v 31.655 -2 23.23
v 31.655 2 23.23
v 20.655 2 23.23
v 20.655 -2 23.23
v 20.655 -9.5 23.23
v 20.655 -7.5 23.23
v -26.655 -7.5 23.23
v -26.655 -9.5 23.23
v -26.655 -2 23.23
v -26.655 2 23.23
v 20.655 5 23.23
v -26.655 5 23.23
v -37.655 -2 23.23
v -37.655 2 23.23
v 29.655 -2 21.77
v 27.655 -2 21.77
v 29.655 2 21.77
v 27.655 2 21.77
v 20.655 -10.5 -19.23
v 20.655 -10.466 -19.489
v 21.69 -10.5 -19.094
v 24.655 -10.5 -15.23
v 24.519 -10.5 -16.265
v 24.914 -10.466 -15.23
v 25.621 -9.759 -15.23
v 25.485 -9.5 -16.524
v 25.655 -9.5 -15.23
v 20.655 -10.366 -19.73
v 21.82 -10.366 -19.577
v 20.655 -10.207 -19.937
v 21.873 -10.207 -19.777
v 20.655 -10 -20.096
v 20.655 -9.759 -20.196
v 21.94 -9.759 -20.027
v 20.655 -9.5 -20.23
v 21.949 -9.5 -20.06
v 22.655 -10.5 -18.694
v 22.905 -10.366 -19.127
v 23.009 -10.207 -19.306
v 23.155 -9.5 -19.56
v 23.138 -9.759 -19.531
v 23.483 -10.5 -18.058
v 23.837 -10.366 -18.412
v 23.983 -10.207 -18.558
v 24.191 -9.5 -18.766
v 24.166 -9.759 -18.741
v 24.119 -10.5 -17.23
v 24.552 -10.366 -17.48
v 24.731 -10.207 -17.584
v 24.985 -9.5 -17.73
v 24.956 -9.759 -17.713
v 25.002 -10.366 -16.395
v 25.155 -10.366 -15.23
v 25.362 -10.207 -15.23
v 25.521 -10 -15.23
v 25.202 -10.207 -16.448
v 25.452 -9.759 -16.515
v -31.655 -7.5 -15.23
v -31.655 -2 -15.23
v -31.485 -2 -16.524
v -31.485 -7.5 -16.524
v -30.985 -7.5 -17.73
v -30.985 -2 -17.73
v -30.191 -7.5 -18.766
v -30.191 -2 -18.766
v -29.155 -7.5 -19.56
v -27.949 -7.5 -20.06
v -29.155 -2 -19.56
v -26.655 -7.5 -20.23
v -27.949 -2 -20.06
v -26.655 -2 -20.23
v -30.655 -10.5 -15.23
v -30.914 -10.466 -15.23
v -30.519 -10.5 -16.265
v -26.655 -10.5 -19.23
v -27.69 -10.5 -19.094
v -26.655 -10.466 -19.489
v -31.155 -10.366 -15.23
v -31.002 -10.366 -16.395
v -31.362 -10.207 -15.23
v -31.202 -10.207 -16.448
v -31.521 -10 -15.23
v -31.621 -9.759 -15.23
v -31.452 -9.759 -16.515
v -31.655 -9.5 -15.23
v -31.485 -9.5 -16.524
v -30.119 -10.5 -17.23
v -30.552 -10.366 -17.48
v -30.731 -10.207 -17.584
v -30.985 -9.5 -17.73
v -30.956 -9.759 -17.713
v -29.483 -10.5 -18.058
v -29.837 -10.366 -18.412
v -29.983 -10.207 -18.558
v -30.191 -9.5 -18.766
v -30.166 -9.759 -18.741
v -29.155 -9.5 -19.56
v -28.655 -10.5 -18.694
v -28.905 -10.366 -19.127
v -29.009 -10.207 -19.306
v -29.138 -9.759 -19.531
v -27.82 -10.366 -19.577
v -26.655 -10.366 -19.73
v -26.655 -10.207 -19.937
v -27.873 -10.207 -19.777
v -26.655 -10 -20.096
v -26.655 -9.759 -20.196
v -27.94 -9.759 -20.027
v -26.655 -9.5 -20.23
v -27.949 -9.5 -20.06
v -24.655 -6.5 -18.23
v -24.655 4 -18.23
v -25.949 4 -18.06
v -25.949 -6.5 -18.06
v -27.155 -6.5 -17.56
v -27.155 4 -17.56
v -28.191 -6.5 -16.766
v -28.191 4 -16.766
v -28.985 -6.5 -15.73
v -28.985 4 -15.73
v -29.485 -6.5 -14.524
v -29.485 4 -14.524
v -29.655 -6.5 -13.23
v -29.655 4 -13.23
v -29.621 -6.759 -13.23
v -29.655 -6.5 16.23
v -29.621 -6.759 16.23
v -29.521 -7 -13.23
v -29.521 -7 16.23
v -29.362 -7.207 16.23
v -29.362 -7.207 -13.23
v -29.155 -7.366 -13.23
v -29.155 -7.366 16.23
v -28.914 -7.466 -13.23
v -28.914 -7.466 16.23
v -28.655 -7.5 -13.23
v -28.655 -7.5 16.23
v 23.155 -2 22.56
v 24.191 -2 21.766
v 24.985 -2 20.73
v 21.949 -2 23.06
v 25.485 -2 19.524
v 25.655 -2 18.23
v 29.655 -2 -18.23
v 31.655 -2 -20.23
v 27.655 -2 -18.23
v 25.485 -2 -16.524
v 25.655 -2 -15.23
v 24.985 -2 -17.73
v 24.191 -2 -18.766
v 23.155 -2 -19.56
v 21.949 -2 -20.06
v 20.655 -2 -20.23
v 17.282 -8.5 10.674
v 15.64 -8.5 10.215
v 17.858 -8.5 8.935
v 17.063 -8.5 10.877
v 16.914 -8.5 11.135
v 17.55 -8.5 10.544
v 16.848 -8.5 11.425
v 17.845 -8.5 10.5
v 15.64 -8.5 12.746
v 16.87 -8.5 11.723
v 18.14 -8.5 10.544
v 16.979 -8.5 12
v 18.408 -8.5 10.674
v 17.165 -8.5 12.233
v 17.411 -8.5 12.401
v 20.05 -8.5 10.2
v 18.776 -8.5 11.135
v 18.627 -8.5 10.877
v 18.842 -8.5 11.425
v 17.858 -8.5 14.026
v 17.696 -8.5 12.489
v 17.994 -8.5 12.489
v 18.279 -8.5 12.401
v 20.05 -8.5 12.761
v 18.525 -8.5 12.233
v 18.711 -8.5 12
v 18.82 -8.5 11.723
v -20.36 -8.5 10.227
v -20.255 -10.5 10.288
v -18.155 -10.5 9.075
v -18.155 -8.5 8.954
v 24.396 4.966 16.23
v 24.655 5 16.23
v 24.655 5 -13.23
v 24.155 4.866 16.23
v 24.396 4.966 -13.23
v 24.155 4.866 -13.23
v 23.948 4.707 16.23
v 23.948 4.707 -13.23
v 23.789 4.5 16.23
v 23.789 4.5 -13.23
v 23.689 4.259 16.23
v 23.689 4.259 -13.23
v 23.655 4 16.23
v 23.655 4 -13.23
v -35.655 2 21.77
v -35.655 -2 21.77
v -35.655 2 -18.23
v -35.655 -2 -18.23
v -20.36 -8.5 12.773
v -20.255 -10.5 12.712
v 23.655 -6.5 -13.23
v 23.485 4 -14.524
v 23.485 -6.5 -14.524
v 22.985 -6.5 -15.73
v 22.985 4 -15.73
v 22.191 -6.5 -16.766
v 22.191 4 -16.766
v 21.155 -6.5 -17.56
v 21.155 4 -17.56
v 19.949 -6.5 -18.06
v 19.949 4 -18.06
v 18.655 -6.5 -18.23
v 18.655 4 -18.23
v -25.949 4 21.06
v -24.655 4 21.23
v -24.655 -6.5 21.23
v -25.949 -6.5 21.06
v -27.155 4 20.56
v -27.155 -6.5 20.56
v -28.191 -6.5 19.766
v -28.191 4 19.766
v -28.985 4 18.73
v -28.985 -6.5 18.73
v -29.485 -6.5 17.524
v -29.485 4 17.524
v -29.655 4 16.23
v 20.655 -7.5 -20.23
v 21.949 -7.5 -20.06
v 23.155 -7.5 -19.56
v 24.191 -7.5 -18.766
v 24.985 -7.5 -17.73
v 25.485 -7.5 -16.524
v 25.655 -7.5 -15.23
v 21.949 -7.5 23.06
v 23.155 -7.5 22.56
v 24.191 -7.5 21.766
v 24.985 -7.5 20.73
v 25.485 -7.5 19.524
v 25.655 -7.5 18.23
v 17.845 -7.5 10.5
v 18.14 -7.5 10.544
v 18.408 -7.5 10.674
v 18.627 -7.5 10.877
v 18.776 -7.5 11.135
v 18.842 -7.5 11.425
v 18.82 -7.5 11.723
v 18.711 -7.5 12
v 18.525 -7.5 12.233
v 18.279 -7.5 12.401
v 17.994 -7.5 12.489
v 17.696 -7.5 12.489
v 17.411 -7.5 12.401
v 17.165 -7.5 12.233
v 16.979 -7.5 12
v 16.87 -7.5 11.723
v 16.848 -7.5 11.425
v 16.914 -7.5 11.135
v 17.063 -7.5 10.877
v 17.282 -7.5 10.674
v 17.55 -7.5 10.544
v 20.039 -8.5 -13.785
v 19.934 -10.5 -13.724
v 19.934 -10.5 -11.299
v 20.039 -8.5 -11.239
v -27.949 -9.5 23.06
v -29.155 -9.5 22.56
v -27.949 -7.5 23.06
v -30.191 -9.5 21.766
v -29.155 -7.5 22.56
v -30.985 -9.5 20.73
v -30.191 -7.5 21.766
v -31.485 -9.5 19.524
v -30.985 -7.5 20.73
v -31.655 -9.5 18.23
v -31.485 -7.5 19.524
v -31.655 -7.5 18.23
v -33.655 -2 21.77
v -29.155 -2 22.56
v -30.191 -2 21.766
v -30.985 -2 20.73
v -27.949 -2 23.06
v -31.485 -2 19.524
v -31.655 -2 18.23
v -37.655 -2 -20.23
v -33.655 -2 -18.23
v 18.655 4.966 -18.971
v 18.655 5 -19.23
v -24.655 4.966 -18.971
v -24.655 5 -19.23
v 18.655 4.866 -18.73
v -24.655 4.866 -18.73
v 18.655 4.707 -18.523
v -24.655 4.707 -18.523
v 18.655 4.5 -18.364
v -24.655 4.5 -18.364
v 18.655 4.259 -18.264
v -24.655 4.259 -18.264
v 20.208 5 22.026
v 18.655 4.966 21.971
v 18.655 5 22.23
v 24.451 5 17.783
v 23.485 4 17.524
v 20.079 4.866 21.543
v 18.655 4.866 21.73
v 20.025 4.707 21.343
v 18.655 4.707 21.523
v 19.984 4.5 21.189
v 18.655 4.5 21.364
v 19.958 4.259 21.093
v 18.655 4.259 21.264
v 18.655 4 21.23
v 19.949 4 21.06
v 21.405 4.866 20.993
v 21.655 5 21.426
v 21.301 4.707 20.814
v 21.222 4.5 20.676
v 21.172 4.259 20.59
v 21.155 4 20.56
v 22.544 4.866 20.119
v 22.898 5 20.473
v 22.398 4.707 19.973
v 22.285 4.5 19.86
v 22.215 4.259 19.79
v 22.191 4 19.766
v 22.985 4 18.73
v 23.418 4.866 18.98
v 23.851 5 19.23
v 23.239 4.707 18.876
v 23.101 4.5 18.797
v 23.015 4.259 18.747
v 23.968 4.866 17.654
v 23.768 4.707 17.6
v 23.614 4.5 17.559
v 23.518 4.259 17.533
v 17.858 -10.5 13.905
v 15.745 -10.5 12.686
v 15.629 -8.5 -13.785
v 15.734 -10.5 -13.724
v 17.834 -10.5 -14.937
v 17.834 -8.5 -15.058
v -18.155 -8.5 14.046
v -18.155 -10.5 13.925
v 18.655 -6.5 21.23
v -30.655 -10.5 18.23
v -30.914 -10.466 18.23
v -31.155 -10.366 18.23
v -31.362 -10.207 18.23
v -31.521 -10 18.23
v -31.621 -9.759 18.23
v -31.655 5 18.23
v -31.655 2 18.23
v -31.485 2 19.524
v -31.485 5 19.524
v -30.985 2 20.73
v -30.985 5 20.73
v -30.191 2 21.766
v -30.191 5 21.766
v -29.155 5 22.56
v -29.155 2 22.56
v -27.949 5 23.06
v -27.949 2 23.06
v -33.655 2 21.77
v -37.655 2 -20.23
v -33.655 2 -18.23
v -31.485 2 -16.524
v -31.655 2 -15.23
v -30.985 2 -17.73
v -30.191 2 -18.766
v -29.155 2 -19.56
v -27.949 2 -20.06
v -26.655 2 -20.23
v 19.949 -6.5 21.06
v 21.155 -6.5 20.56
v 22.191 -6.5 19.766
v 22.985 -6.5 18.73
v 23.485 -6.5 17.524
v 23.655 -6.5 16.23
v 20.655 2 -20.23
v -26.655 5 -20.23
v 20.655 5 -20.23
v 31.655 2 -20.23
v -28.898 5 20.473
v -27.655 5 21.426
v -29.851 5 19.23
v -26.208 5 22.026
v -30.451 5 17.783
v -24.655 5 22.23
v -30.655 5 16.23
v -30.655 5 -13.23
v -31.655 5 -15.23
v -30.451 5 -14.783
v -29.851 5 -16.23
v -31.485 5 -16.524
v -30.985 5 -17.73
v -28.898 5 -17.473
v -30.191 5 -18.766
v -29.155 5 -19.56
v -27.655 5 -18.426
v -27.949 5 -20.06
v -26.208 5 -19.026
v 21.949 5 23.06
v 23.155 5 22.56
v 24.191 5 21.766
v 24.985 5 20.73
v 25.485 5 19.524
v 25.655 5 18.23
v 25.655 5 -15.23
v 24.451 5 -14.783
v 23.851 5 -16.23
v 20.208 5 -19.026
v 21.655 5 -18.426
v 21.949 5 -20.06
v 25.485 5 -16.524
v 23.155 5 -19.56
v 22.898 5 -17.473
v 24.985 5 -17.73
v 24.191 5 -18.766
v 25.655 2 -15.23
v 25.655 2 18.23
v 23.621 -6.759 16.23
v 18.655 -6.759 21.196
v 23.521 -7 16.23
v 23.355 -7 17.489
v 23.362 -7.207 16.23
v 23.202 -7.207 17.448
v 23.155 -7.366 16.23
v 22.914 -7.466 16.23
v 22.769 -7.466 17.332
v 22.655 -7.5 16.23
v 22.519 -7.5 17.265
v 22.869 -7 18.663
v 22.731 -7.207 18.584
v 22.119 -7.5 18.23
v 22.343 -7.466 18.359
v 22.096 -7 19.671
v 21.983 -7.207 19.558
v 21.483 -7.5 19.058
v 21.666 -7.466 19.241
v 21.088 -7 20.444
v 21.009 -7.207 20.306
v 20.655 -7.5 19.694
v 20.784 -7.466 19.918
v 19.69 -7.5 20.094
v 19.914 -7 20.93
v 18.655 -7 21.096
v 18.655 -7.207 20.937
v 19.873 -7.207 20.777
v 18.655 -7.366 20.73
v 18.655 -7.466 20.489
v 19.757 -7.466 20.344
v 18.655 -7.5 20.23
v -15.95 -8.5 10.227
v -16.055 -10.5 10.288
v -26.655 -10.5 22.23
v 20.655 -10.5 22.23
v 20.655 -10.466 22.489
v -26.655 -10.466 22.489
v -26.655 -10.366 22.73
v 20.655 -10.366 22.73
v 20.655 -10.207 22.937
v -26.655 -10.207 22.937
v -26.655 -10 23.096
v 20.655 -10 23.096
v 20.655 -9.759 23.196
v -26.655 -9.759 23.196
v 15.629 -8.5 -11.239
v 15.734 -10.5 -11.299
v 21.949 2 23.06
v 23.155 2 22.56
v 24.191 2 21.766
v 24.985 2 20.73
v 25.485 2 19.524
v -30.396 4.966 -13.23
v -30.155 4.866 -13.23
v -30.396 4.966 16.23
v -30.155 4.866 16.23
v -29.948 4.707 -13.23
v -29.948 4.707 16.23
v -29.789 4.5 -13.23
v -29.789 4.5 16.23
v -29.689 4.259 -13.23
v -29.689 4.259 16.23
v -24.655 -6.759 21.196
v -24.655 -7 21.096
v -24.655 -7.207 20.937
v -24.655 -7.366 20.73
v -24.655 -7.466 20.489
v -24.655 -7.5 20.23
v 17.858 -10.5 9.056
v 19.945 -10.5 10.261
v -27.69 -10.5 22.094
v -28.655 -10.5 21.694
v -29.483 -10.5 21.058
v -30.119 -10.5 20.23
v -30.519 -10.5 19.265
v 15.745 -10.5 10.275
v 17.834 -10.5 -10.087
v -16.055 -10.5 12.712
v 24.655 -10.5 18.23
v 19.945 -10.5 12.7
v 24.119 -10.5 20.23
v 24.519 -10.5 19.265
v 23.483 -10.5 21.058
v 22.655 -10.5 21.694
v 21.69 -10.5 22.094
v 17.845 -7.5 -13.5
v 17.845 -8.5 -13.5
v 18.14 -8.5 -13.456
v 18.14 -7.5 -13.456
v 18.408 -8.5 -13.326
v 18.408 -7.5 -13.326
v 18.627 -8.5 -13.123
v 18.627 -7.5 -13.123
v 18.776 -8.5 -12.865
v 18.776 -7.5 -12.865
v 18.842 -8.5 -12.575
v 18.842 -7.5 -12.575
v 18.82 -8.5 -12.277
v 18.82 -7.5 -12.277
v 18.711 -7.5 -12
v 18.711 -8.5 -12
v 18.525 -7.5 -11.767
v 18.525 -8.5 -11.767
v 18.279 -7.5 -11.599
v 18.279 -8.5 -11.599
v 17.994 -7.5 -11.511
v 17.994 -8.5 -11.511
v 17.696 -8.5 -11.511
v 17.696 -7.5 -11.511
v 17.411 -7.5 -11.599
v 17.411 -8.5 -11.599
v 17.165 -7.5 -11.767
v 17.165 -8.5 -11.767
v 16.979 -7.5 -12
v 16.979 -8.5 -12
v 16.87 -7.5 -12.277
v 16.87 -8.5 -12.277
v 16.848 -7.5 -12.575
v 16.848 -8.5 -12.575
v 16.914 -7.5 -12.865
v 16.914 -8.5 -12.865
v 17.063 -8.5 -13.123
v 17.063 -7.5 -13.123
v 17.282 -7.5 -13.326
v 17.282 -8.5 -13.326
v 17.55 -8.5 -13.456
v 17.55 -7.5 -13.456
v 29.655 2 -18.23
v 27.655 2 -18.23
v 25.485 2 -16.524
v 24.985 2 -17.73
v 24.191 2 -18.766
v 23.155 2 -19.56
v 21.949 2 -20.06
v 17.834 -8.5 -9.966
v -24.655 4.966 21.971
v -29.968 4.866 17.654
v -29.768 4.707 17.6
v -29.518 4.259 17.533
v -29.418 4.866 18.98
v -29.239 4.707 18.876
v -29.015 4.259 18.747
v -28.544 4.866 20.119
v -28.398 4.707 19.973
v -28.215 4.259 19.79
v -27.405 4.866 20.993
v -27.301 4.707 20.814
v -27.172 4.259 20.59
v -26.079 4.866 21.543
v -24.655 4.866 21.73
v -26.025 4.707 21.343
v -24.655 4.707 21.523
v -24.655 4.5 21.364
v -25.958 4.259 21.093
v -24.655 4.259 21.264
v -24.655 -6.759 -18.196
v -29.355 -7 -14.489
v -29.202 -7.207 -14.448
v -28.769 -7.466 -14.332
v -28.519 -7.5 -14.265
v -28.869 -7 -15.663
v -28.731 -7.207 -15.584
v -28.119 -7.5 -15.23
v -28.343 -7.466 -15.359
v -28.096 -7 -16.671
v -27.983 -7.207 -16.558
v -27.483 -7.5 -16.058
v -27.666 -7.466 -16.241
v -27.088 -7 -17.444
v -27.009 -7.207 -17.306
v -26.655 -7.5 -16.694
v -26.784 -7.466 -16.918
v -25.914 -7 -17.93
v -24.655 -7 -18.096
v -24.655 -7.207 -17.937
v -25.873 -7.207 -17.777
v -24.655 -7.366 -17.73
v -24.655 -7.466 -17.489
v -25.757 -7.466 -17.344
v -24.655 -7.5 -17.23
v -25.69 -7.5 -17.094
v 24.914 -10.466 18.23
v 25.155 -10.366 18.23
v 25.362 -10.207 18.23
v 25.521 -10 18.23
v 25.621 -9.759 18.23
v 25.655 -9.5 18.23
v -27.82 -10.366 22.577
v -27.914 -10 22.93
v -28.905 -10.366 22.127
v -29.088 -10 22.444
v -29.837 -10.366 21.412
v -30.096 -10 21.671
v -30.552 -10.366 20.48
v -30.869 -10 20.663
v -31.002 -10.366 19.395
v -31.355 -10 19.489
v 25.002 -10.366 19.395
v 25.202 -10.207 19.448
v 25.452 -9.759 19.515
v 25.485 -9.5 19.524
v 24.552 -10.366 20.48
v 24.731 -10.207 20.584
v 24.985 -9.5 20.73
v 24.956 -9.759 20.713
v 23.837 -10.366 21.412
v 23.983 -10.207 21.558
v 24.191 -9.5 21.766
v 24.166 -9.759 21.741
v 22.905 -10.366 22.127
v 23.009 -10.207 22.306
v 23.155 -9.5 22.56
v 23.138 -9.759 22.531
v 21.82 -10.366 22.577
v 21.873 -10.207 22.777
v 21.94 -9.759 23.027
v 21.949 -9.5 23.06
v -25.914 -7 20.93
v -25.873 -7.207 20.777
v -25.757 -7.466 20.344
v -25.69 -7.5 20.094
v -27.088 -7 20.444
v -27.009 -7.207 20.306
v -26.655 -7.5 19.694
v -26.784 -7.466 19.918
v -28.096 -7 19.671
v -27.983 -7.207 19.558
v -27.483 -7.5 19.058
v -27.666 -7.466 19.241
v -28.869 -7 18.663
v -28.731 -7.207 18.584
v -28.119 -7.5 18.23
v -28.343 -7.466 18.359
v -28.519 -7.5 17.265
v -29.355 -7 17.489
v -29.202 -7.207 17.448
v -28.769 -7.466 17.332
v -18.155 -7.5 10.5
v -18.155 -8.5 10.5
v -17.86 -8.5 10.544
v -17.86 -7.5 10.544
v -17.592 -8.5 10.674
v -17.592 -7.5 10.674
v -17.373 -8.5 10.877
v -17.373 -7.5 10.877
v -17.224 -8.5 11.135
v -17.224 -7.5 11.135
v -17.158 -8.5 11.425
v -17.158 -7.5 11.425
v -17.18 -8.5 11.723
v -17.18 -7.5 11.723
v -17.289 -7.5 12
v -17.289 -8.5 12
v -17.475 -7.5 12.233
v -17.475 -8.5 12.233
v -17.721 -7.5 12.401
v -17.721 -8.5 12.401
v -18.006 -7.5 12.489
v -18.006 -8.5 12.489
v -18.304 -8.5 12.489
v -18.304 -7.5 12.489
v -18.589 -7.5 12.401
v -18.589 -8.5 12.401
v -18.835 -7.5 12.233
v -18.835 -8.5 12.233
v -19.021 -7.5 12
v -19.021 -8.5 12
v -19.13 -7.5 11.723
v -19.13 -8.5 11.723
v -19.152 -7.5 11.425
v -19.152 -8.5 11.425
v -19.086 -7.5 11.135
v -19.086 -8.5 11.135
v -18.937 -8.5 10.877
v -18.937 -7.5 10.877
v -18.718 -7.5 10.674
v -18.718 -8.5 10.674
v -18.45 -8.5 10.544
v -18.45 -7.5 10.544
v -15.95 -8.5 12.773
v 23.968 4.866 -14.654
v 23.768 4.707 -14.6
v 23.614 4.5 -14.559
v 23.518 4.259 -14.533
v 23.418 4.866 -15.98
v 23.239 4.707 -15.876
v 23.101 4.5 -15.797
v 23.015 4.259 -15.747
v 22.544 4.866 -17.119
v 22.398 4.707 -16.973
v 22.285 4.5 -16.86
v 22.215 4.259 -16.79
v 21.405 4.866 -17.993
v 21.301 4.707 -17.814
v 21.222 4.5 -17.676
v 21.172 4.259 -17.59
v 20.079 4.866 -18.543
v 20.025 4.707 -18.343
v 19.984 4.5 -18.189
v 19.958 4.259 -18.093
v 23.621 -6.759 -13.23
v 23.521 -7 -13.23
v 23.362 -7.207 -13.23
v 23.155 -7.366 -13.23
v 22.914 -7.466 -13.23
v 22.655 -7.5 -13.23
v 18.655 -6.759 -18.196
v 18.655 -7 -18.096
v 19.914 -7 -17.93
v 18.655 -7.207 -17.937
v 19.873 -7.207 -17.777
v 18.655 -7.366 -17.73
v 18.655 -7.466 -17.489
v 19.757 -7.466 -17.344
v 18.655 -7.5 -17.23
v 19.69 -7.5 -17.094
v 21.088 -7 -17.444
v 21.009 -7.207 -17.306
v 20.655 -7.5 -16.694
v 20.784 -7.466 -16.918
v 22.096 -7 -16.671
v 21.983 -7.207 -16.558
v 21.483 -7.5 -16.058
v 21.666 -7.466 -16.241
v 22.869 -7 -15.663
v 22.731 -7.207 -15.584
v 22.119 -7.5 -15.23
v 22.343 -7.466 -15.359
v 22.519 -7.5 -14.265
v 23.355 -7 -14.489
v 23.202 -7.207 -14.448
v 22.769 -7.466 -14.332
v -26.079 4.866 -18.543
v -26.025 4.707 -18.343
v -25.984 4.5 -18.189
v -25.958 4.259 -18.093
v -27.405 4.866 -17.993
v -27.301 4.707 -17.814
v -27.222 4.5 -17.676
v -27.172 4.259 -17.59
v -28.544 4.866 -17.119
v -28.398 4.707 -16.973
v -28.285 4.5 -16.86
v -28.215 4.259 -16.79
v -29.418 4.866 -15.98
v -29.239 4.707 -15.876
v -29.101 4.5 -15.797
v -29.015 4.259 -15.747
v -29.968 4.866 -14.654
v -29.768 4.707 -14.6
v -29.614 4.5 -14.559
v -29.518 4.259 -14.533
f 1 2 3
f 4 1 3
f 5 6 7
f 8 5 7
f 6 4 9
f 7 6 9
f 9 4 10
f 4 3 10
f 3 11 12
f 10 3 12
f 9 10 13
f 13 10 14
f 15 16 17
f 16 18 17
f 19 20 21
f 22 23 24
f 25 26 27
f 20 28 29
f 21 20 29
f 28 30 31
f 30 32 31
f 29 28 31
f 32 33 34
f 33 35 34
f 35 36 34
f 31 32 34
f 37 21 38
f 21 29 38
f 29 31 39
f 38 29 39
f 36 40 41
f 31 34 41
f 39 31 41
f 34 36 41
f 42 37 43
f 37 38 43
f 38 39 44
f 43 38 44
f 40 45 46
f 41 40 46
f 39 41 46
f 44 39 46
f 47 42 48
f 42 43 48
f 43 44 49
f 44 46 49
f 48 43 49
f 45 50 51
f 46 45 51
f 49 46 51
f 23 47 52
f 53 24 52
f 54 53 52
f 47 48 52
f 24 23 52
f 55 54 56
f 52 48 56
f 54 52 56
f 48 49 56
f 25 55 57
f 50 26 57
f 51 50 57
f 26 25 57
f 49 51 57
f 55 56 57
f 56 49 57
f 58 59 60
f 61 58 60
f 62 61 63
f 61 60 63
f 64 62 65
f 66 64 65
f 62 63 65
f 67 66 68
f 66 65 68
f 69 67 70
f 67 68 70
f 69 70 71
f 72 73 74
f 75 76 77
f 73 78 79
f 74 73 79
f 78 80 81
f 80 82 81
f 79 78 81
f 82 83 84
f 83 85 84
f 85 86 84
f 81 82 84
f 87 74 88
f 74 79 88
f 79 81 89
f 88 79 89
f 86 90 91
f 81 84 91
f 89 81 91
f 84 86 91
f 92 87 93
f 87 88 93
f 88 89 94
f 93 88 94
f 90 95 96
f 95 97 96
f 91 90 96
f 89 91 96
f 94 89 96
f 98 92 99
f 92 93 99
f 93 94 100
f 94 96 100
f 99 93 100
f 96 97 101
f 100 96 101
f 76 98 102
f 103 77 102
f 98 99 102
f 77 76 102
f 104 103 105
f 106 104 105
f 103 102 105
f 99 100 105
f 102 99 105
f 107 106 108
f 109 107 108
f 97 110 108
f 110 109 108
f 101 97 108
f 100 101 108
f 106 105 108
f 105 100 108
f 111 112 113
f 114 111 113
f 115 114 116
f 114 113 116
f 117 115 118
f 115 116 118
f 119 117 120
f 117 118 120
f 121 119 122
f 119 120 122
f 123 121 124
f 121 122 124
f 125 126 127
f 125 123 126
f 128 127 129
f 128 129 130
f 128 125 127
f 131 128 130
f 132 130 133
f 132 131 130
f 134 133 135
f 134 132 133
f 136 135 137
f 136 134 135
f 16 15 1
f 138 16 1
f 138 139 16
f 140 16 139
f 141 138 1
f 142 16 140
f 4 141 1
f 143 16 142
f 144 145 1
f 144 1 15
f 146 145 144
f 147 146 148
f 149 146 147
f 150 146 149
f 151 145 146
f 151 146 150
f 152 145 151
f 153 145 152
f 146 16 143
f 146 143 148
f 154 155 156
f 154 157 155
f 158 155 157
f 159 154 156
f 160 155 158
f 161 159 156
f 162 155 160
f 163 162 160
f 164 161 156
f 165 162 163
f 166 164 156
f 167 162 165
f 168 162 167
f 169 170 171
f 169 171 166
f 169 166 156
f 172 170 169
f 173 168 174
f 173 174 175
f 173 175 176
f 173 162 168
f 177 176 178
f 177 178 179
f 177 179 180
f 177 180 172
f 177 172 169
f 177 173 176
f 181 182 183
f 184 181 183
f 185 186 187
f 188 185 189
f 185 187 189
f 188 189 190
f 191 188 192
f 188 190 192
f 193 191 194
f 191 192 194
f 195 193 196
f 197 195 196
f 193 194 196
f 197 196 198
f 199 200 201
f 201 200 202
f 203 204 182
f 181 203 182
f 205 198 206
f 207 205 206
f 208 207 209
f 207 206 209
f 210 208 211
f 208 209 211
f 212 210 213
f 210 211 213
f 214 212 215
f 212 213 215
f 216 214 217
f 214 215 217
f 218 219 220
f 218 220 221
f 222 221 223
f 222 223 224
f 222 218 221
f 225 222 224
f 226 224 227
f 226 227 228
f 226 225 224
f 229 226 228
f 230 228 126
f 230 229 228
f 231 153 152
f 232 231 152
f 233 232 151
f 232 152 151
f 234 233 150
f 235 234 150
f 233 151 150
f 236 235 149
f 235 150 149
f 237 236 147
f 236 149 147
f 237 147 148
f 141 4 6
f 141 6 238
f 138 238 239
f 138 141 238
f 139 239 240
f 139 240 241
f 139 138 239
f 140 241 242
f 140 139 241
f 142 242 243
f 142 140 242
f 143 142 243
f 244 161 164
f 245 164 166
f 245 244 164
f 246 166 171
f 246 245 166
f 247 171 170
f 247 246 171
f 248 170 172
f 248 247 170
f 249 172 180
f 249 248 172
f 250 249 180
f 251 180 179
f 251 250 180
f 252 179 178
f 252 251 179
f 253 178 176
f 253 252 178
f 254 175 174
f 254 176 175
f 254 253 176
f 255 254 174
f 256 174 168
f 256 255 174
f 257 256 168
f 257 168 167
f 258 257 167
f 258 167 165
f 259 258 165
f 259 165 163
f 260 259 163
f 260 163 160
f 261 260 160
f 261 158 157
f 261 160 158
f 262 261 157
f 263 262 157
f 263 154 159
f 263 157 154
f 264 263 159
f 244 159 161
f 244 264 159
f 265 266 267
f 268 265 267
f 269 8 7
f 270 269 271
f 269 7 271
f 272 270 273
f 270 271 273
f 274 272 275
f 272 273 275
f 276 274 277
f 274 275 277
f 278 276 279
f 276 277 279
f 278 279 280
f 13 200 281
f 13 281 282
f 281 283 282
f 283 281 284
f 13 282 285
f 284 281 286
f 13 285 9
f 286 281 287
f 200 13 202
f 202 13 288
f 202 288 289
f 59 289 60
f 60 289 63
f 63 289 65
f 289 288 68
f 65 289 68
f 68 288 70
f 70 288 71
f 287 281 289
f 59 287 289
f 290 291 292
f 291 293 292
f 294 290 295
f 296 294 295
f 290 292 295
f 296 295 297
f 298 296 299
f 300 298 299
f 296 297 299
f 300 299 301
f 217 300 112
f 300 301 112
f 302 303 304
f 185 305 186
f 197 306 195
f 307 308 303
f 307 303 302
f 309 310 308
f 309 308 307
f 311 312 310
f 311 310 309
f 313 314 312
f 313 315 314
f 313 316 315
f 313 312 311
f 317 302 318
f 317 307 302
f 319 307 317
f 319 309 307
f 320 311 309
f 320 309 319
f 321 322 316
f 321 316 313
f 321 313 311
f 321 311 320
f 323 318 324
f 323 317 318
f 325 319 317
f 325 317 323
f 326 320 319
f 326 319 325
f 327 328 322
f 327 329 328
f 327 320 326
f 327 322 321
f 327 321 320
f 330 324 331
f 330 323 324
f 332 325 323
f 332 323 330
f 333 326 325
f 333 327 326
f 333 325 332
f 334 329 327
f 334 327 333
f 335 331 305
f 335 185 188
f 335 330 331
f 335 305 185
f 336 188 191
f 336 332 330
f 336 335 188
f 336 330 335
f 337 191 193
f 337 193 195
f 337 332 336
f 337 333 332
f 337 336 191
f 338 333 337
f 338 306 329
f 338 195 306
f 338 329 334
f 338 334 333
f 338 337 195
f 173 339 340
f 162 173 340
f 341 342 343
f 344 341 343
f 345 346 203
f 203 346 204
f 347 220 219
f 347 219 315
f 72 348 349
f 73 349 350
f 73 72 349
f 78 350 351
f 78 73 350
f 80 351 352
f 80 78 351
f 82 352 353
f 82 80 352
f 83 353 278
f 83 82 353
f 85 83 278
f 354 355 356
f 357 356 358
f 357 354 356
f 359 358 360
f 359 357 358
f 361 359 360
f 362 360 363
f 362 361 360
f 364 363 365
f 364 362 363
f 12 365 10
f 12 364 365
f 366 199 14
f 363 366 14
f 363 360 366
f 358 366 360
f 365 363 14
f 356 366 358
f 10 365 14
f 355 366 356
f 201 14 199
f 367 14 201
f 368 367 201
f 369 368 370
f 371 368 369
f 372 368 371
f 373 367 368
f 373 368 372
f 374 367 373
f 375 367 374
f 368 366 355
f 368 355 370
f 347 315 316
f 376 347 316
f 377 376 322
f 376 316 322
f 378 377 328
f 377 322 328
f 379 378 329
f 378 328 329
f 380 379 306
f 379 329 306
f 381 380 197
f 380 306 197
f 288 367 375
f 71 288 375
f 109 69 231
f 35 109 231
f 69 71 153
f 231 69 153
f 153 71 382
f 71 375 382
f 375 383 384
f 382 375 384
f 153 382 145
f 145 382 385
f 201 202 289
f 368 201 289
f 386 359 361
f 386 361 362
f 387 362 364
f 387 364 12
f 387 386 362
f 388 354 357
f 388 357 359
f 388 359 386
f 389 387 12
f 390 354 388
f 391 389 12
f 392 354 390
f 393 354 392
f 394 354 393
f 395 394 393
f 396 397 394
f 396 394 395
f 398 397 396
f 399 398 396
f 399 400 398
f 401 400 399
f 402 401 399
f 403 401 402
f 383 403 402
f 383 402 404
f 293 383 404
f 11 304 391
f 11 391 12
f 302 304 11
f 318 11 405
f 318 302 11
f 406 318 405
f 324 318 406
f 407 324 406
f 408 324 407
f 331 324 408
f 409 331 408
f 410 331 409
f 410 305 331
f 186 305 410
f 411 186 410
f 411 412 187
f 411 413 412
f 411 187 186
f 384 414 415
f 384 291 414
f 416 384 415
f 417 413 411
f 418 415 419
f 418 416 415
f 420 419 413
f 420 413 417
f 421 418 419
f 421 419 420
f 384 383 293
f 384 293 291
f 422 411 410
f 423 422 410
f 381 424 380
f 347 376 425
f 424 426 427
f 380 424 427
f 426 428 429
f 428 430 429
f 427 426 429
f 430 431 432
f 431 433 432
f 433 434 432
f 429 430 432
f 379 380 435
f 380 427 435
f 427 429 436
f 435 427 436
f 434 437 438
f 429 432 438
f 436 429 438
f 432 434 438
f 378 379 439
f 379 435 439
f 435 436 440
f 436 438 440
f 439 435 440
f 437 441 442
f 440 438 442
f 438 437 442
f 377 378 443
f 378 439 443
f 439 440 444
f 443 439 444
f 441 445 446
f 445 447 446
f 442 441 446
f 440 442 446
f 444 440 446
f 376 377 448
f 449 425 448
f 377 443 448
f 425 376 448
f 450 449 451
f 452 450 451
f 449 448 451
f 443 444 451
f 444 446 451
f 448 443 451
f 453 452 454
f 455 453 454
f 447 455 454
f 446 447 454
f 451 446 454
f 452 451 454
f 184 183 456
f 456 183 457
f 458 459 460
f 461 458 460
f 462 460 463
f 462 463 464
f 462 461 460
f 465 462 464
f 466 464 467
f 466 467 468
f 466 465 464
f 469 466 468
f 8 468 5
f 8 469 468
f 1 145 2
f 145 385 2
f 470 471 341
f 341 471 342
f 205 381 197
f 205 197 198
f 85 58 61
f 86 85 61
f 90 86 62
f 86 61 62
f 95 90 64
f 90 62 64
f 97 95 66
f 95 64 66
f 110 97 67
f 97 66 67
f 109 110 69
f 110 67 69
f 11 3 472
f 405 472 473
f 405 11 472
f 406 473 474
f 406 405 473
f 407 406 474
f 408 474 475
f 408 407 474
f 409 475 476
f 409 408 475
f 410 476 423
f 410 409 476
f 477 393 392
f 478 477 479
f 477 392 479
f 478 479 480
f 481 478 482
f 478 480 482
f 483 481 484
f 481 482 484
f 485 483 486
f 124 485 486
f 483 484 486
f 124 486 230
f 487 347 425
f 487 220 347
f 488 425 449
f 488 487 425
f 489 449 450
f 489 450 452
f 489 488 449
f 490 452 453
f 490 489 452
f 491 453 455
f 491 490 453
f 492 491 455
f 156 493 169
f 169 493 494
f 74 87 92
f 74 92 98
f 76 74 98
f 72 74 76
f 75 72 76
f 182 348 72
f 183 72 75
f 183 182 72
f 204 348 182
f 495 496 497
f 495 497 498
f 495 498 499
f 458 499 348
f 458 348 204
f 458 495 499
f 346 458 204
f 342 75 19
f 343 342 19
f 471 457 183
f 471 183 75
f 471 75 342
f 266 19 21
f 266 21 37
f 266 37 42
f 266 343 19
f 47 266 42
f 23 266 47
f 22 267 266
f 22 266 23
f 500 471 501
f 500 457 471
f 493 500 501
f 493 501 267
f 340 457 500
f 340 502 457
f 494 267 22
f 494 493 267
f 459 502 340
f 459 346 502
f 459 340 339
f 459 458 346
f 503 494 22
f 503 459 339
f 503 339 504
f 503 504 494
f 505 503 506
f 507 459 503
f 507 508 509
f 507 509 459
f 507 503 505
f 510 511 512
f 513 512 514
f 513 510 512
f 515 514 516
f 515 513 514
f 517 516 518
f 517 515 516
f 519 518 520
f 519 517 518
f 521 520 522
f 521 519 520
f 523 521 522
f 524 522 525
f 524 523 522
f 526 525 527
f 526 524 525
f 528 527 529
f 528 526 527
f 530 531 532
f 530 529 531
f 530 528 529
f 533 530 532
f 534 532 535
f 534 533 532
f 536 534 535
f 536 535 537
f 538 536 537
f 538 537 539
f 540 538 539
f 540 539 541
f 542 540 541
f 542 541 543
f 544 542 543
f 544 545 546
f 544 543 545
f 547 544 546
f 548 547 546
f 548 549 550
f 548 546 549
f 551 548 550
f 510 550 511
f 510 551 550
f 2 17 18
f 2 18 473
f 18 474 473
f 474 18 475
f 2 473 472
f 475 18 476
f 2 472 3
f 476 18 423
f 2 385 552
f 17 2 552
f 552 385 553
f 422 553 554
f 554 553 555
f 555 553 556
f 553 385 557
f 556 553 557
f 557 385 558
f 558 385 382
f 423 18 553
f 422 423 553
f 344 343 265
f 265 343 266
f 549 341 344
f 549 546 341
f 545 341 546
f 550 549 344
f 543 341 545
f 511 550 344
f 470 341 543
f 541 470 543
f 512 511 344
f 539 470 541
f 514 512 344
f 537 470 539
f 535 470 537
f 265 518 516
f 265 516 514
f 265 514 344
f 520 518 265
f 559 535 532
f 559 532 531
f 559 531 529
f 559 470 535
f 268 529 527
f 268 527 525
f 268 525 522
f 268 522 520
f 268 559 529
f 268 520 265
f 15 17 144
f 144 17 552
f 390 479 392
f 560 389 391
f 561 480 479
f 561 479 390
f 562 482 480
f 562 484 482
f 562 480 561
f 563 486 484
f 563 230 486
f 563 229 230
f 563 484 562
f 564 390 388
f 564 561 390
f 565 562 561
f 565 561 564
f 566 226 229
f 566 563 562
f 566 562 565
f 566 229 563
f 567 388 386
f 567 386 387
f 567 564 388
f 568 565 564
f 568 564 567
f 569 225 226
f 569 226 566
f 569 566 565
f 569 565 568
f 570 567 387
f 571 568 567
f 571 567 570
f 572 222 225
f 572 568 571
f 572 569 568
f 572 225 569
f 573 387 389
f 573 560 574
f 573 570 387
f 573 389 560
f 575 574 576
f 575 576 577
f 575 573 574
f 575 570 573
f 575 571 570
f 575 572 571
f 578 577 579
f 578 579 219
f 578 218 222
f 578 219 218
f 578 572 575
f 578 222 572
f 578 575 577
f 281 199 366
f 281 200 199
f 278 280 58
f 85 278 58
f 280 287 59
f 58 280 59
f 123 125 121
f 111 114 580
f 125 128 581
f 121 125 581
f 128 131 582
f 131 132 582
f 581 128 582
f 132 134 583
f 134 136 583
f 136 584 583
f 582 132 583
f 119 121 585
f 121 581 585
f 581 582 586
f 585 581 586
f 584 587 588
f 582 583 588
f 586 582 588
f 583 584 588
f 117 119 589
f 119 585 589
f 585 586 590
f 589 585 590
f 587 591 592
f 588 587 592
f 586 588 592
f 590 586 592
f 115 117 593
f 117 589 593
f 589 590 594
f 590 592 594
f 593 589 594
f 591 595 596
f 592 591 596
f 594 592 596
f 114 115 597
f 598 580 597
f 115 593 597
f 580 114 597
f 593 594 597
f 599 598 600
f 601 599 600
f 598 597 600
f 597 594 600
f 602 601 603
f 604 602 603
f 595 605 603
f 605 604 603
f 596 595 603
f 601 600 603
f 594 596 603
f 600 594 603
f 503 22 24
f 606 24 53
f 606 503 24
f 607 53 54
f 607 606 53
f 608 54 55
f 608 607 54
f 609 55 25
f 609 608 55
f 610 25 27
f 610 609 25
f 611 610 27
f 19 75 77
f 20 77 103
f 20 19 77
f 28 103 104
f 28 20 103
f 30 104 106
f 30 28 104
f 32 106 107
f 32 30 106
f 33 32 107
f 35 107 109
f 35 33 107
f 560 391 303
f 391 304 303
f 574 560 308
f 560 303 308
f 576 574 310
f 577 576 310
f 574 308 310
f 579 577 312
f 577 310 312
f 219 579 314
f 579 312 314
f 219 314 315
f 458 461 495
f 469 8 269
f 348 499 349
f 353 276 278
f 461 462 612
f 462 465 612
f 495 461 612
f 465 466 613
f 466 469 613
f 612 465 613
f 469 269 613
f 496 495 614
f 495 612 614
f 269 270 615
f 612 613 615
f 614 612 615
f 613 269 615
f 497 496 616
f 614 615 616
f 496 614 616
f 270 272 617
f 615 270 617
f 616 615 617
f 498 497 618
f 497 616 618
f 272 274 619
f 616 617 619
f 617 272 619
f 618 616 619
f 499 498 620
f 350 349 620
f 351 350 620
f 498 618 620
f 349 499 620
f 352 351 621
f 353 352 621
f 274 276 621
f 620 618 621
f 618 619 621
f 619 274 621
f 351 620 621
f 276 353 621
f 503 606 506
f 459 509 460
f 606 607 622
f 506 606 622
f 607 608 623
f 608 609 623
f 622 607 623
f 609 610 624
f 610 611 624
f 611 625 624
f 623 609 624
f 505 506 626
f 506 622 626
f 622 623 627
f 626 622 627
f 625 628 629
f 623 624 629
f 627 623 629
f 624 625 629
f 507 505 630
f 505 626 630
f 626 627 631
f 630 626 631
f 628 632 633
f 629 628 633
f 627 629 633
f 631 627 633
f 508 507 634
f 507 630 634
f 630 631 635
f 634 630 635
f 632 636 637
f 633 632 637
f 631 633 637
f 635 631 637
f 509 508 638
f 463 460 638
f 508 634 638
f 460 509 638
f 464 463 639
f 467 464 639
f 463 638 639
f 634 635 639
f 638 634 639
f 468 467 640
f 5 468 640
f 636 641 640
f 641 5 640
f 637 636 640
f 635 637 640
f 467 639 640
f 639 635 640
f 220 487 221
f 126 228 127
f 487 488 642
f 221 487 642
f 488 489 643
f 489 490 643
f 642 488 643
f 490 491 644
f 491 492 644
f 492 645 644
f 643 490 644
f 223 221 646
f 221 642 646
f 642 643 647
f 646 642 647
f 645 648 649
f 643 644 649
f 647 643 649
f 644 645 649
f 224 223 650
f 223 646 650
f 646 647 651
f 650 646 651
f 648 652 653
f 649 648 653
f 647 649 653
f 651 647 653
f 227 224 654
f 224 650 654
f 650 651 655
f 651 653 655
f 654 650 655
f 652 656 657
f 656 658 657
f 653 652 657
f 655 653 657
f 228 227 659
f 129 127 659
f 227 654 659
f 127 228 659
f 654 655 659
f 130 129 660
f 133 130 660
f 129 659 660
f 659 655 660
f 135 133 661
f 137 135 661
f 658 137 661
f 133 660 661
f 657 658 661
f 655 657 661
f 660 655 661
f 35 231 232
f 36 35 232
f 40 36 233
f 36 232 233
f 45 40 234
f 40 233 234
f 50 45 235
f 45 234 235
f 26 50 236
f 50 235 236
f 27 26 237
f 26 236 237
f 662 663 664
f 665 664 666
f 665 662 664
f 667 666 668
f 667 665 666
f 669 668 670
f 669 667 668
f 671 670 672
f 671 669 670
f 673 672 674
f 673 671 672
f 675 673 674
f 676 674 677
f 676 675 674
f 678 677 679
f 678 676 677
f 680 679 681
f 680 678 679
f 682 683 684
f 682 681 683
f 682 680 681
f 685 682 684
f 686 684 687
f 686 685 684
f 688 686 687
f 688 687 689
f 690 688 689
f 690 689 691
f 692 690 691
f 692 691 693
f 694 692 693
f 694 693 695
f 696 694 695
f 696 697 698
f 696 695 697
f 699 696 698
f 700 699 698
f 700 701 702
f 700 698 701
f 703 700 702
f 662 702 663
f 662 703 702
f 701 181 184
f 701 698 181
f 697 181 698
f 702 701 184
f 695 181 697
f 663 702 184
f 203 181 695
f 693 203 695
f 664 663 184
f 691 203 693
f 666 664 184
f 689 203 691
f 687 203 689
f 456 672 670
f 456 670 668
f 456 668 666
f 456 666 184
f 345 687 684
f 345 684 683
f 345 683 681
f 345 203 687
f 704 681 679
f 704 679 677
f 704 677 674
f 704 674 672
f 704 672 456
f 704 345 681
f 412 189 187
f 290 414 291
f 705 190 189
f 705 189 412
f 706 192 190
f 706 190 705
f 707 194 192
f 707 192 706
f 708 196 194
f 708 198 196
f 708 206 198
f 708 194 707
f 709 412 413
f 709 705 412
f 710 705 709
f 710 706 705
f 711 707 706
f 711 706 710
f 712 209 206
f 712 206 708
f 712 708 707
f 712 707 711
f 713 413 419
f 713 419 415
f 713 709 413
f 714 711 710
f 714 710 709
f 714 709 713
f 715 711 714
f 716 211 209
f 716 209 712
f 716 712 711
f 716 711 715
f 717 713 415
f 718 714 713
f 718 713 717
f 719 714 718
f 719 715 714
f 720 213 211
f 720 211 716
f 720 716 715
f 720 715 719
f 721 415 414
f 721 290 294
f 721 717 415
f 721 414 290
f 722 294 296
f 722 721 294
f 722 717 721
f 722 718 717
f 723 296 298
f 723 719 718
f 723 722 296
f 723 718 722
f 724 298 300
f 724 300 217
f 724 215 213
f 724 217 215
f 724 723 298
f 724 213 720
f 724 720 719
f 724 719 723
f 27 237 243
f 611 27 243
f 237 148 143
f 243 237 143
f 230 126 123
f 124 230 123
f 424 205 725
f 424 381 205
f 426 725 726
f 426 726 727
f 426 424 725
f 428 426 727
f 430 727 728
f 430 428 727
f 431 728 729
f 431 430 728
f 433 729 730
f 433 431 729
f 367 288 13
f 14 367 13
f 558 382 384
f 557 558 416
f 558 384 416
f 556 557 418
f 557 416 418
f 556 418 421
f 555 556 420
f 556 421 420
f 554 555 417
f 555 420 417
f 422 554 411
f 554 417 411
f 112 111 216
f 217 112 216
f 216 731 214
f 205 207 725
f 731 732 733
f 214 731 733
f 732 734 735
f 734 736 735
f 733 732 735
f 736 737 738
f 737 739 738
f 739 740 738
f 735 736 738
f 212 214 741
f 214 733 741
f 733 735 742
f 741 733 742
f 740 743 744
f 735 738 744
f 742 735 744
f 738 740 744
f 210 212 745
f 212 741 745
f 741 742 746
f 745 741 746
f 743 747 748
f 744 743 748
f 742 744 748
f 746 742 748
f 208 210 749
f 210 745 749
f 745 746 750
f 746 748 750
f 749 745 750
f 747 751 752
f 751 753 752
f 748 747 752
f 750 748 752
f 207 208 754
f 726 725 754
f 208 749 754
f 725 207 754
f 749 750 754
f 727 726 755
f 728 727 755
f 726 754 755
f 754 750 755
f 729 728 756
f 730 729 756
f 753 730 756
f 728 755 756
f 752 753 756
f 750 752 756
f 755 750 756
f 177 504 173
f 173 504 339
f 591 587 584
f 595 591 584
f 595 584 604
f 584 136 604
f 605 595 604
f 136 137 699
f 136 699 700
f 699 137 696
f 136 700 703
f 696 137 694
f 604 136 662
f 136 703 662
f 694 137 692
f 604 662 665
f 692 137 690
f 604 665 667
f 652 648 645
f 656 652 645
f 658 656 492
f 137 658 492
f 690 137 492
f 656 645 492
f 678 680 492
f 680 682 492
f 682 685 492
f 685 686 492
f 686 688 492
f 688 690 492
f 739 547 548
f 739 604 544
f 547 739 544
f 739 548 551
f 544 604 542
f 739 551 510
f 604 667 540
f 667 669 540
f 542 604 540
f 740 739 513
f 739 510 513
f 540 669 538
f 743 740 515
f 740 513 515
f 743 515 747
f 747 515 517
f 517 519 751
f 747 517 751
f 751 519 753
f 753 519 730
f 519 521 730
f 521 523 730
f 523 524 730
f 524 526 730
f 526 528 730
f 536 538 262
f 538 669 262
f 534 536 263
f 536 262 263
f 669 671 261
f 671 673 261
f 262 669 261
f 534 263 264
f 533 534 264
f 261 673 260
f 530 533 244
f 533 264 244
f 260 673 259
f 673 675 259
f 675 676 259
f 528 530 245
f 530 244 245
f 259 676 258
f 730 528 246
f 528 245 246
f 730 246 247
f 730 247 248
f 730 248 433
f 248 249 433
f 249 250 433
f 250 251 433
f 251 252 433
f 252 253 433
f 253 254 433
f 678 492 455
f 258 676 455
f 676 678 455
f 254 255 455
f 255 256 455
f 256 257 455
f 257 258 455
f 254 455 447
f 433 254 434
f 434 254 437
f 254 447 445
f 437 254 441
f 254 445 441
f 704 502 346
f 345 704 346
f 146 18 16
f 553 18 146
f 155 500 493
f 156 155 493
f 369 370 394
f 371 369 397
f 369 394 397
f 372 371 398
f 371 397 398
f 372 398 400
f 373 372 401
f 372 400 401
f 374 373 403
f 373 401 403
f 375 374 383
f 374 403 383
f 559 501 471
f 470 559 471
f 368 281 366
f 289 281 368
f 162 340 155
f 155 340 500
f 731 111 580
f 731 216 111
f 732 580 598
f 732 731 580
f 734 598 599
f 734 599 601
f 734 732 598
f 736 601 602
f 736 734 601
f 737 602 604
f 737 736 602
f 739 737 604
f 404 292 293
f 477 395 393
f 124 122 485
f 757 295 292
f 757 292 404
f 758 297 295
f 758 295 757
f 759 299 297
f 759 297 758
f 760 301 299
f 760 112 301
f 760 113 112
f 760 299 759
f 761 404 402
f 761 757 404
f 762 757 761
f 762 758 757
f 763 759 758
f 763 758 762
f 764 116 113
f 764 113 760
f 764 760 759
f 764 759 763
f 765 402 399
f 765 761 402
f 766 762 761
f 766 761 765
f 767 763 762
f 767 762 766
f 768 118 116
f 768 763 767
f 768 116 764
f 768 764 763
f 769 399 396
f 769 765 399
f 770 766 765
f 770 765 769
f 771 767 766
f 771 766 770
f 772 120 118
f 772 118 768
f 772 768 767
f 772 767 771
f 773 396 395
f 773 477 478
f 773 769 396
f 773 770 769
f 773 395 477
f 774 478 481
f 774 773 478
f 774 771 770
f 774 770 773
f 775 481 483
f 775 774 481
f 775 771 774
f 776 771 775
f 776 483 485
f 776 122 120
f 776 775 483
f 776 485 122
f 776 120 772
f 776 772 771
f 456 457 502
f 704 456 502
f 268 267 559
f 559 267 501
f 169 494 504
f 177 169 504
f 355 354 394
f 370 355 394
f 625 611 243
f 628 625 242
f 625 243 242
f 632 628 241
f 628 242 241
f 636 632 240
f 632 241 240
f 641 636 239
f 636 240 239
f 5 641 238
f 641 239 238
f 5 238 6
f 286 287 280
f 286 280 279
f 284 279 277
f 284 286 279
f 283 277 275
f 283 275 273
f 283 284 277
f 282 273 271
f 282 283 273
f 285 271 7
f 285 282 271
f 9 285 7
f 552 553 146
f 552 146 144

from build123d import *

# Parameters (mm, degrees)
BOSS_EXTRUDE1_DEPTH          = 5
BOSS_EXTRUDE1_DEPTH_BACK     = 7.5
SKETCH2_W                    = 57.31
SKETCH2_H                    = 43.46
SKETCH2_W_2                  = 53.31
SKETCH2_H_2                  = 39.46
FILLET1_R                    = 5
SKETCH3_R                    = 1
BOSS_EXTRUDE2_DEPTH          = 3
CUT_EXTRUDE1_DEPTH           = 2
CUT_EXTRUDE1_DRAFT           = 3
SKETCH5_R                    = 1
CUT_EXTRUDE1_PROFILE_2_DEPTH = 2
CUT_EXTRUDE1_PROFILE_2_DRAFT = 3
CUT_EXTRUDE1_PROFILE_3_DEPTH = 2
CUT_EXTRUDE1_PROFILE_3_DRAFT = 3
FILLET2_R                    = 1
SKETCH6_W                    = 2
SKETCH6_H                    = 40
BOSS_EXTRUDE3_DEPTH          = 2
FILLET3_R                    = 1


with BuildPart() as part:
    # Sketch2 → Boss-Extrude1 (new, two sides: drawn at the far end of the back side and taken through both)
    with BuildSketch(Plane(origin=(0, 0, 0), x_dir=(1, 0, 0), z_dir=(0, 1, 0)).offset(-BOSS_EXTRUDE1_DEPTH_BACK)):
        with Locations((-3, -1.5)):
            Rectangle(SKETCH2_W, SKETCH2_H)
        with Locations((-3, -1.5)):
            Rectangle(SKETCH2_W_2, SKETCH2_H_2, mode=Mode.SUBTRACT)
    extrude(amount=BOSS_EXTRUDE1_DEPTH + BOSS_EXTRUDE1_DEPTH_BACK)

    # Fillet1
    fillet1_edges = [part.edges().sort_by_distance(p)[0] for p in [
        (-29.655, -1.25, 21.23),
        (-29.655, -1.25, -18.23),
        (23.655, -1.25, -18.23),
        (23.655, -1.25, 21.23),
        (-31.655, -1.25, -20.23),
        (25.655, -1.25, -20.23),
        (25.655, -1.25, 23.23),
        (-31.655, -1.25, 23.23),
    ]]
    fillet(fillet1_edges, radius=FILLET1_R)

    # Sketch3 → Boss-Extrude2 (add)
    with BuildSketch(Plane.XZ.offset(7.5)):
        with BuildLine():
            Line((-31.655, 18.23), (-31.655, -15.23))
            ThreePointArc((-31.655, -15.23), (-30.190533906, -18.765533906), (-26.655, -20.23))
            Line((-26.655, -20.23), (20.655, -20.23))
            ThreePointArc((20.655, -20.23), (24.190533906, -18.765533906), (25.655, -15.23))
            Line((25.655, -15.23), (25.655, 18.23))
            ThreePointArc((25.655, 18.23), (24.190533906, 21.765533906), (20.655, 23.23))
            Line((20.655, 23.23), (-26.655, 23.23))
            ThreePointArc((-26.655, 23.23), (-30.190533906, 21.765533906), (-31.655, 18.23))
        make_face()
        with Locations(Location((-18.155, 11.5, 0), (0, 0, 270))):
            Circle(SKETCH3_R, mode=Mode.SUBTRACT)
        with Locations(Location((17.845, 11.5, 0), (0, 0, 270))):
            Circle(SKETCH3_R, mode=Mode.SUBTRACT)
        with Locations(Location((17.845, -12.5, 0), (0, 0, 270))):
            Circle(SKETCH3_R, mode=Mode.SUBTRACT)
    extrude(amount=BOSS_EXTRUDE2_DEPTH)


with BuildPart() as cut_extrude1_tool:
    # Sketch5 → Cut-Extrude1 (with draft: the straight prism first)
    with BuildSketch(Plane.XZ.offset(10.5)):
        Polygon((-18.155, 13.924871131), (-20.255, 12.712435565), (-20.255, 10.287564435), (-18.155, 9.075128869), (-16.055, 10.287564435), (-16.055, 12.712435565), align=None)
    extrude(amount=-CUT_EXTRUDE1_DEPTH)
    # Cut-Extrude1: the draft: its side faces are tilted about the plane it starts from
    cut_extrude1_sides = [cut_extrude1_tool.faces().sort_by_distance(p)[0] for p in [
        (-19.205, -9.5, 13.318653348),
        (-20.255, -9.5, 11.5),
        (-19.205, -9.5, 9.681346652),
        (-17.105, -9.5, 9.681346652),
        (-16.055, -9.5, 11.5),
        (-17.105, -9.5, 13.318653348),
    ]]
    draft(cut_extrude1_sides, Plane.XZ.offset(10.5), CUT_EXTRUDE1_DRAFT)


with BuildPart() as part_1:
    add(part.part)

    # Cut-Extrude1: cut by cut_extrude1_tool
    add(cut_extrude1_tool.part, mode=Mode.SUBTRACT)


with BuildPart() as cut_extrude1_profile_2_tool:
    # Sketch5 → Cut-Extrude1 profile 2 (with draft: the straight prism first)
    with BuildSketch(Plane.XZ.offset(10.5)):
        Polygon((17.857823878, 13.905392128), (15.745, 12.685552694), (15.745, 10.275489302), (17.857823878, 9.055649867), (19.945, 10.260681563), (19.945, 12.700360432), align=None)
        with Locations(Location((17.845, 11.5, 0), (0, 0, 270))):
            Circle(SKETCH5_R, mode=Mode.SUBTRACT)
    extrude(amount=-CUT_EXTRUDE1_PROFILE_2_DEPTH)
    # Cut-Extrude1 profile 2: the draft: its side faces are tilted about the plane it starts from
    cut_extrude1_profile_2_sides = [cut_extrude1_profile_2_tool.faces().sort_by_distance(p)[0] for p in [
        (16.801411939, -9.5, 13.295472411),
        (15.745, -9.5, 11.480520998),
        (16.801411939, -9.5, 9.665569584),
        (18.901411939, -9.5, 9.658165715),
        (19.945, -9.5, 11.480520998),
        (18.901411939, -9.5, 13.30287628),
        (17.845, -9.5, 12.5),
    ]]
    draft(cut_extrude1_profile_2_sides, Plane.XZ.offset(10.5), CUT_EXTRUDE1_PROFILE_2_DRAFT)


with BuildPart() as part_2:
    add(part_1.part)

    # Cut-Extrude1 profile 2: cut by cut_extrude1_profile_2_tool
    add(cut_extrude1_profile_2_tool.part, mode=Mode.SUBTRACT)


with BuildPart() as cut_extrude1_profile_3_tool:
    # Sketch5 → Cut-Extrude1 profile 3 (with draft: the straight prism first)
    with BuildSketch(Plane.XZ.offset(10.5)):
        Polygon((17.833837254, -10.086917044), (15.733837254, -11.299352609), (15.733837254, -13.724223739), (17.833837254, -14.936659305), (19.933837254, -13.724223739), (19.933837254, -11.299352609), align=None)
        with Locations(Location((17.845, -12.5, 0), (0, 0, 270))):
            Circle(SKETCH5_R, mode=Mode.SUBTRACT)
    extrude(amount=-CUT_EXTRUDE1_PROFILE_3_DEPTH)
    # Cut-Extrude1 profile 3: the draft: its side faces are tilted about the plane it starts from
    cut_extrude1_profile_3_sides = [cut_extrude1_profile_3_tool.faces().sort_by_distance(p)[0] for p in [
        (16.783837254, -9.5, -10.693134826),
        (15.733837254, -9.5, -12.511788174),
        (16.783837254, -9.5, -14.330441522),
        (18.883837254, -9.5, -14.330441522),
        (19.933837254, -9.5, -12.511788174),
        (18.883837254, -9.5, -10.693134826),
        (17.845, -9.5, -11.5),
    ]]
    draft(cut_extrude1_profile_3_sides, Plane.XZ.offset(10.5), CUT_EXTRUDE1_PROFILE_3_DRAFT)


with BuildPart() as part_3:
    add(part_2.part)

    # Cut-Extrude1 profile 3: cut by cut_extrude1_profile_3_tool
    add(cut_extrude1_profile_3_tool.part, mode=Mode.SUBTRACT)

    # Fillet2
    fillet2_edges = [part_3.edges().sort_by_distance(p)[0] for p in [
        (-3, 5, 21.23),
        (-29.655, 5, 1.5),
        (-3, 5, -18.23),
        (23.655, 5, 1.5),
        (-3, -7.5, -18.23),
        (-29.655, -7.5, 1.5),
        (-3, -7.5, 21.23),
        (23.655, -7.5, 1.5),
        (22.190533906, 5, 19.765533906),
        (22.190533906, -7.5, 19.765533906),
        (-28.190533906, 5, 19.765533906),
        (-28.190533906, -7.5, 19.765533906),
        (22.190533906, 5, -16.765533906),
        (22.190533906, -7.5, -16.765533906),
        (-28.190533906, 5, -16.765533906),
        (-28.190533906, -7.5, -16.765533906),
    ]]
    fillet(fillet2_edges, radius=FILLET2_R)

    # Sketch6 → Boss-Extrude3 (add, symmetric)
    # profile 1 of 2: a face of its own
    with BuildSketch(Plane(origin=(0, 0, 0), x_dir=(1, 0, 0), z_dir=(0, 1, 0))):
        with BuildLine():
            Line((-37.655, 20.23), (-37.655, -23.23))
            Line((-37.655, -23.23), (-26.655, -23.23))
            ThreePointArc((-26.655, -23.23), (-30.190533906, -21.765533906), (-31.655, -18.23))
            Line((-31.655, -18.23), (-31.655, 15.23))
            ThreePointArc((-31.655, 15.23), (-30.190533906, 18.765533906), (-26.655, 20.23))
            Line((-26.655, 20.23), (-37.655, 20.23))
        make_face()
        with Locations((-34.655, -1.77)):
            Rectangle(SKETCH6_W, SKETCH6_H, mode=Mode.SUBTRACT)
    # profile 2 of 2: a face of its own
    with BuildSketch(Plane(origin=(0, 0, 0), x_dir=(1, 0, 0), z_dir=(0, 1, 0))):
        with BuildLine():
            Line((20.655, 20.23), (31.655, 20.23))
            Line((31.655, 20.23), (31.655, -23.23))
            Line((31.655, -23.23), (20.655, -23.23))
            ThreePointArc((20.655, -23.23), (24.190533906, -21.765533906), (25.655, -18.23))
            Line((25.655, -18.23), (25.655, 15.23))
            ThreePointArc((25.655, 15.23), (24.190533906, 18.765533906), (20.655, 20.23))
        make_face()
        with Locations((28.655, -1.77)):
            Rectangle(SKETCH6_W, SKETCH6_H, mode=Mode.SUBTRACT)
    extrude(amount=BOSS_EXTRUDE3_DEPTH, both=True)

    # Fillet3
    fillet3_edges = [part_3.edges().sort_by_distance(p)[0] for p in [
        (-30.190533906, -10.5, 21.765533906),
        (-31.655, -10.5, 1.5),
        (-30.190533906, -10.5, -18.765533906),
        (-3, -10.5, -20.23),
        (24.190533906, -10.5, -18.765533906),
        (25.655, -10.5, 1.5),
        (24.190533906, -10.5, 21.765533906),
        (-3, -10.5, 23.23),
    ]]
    fillet(fillet3_edges, radius=FILLET3_R)


solid = part_3.part
